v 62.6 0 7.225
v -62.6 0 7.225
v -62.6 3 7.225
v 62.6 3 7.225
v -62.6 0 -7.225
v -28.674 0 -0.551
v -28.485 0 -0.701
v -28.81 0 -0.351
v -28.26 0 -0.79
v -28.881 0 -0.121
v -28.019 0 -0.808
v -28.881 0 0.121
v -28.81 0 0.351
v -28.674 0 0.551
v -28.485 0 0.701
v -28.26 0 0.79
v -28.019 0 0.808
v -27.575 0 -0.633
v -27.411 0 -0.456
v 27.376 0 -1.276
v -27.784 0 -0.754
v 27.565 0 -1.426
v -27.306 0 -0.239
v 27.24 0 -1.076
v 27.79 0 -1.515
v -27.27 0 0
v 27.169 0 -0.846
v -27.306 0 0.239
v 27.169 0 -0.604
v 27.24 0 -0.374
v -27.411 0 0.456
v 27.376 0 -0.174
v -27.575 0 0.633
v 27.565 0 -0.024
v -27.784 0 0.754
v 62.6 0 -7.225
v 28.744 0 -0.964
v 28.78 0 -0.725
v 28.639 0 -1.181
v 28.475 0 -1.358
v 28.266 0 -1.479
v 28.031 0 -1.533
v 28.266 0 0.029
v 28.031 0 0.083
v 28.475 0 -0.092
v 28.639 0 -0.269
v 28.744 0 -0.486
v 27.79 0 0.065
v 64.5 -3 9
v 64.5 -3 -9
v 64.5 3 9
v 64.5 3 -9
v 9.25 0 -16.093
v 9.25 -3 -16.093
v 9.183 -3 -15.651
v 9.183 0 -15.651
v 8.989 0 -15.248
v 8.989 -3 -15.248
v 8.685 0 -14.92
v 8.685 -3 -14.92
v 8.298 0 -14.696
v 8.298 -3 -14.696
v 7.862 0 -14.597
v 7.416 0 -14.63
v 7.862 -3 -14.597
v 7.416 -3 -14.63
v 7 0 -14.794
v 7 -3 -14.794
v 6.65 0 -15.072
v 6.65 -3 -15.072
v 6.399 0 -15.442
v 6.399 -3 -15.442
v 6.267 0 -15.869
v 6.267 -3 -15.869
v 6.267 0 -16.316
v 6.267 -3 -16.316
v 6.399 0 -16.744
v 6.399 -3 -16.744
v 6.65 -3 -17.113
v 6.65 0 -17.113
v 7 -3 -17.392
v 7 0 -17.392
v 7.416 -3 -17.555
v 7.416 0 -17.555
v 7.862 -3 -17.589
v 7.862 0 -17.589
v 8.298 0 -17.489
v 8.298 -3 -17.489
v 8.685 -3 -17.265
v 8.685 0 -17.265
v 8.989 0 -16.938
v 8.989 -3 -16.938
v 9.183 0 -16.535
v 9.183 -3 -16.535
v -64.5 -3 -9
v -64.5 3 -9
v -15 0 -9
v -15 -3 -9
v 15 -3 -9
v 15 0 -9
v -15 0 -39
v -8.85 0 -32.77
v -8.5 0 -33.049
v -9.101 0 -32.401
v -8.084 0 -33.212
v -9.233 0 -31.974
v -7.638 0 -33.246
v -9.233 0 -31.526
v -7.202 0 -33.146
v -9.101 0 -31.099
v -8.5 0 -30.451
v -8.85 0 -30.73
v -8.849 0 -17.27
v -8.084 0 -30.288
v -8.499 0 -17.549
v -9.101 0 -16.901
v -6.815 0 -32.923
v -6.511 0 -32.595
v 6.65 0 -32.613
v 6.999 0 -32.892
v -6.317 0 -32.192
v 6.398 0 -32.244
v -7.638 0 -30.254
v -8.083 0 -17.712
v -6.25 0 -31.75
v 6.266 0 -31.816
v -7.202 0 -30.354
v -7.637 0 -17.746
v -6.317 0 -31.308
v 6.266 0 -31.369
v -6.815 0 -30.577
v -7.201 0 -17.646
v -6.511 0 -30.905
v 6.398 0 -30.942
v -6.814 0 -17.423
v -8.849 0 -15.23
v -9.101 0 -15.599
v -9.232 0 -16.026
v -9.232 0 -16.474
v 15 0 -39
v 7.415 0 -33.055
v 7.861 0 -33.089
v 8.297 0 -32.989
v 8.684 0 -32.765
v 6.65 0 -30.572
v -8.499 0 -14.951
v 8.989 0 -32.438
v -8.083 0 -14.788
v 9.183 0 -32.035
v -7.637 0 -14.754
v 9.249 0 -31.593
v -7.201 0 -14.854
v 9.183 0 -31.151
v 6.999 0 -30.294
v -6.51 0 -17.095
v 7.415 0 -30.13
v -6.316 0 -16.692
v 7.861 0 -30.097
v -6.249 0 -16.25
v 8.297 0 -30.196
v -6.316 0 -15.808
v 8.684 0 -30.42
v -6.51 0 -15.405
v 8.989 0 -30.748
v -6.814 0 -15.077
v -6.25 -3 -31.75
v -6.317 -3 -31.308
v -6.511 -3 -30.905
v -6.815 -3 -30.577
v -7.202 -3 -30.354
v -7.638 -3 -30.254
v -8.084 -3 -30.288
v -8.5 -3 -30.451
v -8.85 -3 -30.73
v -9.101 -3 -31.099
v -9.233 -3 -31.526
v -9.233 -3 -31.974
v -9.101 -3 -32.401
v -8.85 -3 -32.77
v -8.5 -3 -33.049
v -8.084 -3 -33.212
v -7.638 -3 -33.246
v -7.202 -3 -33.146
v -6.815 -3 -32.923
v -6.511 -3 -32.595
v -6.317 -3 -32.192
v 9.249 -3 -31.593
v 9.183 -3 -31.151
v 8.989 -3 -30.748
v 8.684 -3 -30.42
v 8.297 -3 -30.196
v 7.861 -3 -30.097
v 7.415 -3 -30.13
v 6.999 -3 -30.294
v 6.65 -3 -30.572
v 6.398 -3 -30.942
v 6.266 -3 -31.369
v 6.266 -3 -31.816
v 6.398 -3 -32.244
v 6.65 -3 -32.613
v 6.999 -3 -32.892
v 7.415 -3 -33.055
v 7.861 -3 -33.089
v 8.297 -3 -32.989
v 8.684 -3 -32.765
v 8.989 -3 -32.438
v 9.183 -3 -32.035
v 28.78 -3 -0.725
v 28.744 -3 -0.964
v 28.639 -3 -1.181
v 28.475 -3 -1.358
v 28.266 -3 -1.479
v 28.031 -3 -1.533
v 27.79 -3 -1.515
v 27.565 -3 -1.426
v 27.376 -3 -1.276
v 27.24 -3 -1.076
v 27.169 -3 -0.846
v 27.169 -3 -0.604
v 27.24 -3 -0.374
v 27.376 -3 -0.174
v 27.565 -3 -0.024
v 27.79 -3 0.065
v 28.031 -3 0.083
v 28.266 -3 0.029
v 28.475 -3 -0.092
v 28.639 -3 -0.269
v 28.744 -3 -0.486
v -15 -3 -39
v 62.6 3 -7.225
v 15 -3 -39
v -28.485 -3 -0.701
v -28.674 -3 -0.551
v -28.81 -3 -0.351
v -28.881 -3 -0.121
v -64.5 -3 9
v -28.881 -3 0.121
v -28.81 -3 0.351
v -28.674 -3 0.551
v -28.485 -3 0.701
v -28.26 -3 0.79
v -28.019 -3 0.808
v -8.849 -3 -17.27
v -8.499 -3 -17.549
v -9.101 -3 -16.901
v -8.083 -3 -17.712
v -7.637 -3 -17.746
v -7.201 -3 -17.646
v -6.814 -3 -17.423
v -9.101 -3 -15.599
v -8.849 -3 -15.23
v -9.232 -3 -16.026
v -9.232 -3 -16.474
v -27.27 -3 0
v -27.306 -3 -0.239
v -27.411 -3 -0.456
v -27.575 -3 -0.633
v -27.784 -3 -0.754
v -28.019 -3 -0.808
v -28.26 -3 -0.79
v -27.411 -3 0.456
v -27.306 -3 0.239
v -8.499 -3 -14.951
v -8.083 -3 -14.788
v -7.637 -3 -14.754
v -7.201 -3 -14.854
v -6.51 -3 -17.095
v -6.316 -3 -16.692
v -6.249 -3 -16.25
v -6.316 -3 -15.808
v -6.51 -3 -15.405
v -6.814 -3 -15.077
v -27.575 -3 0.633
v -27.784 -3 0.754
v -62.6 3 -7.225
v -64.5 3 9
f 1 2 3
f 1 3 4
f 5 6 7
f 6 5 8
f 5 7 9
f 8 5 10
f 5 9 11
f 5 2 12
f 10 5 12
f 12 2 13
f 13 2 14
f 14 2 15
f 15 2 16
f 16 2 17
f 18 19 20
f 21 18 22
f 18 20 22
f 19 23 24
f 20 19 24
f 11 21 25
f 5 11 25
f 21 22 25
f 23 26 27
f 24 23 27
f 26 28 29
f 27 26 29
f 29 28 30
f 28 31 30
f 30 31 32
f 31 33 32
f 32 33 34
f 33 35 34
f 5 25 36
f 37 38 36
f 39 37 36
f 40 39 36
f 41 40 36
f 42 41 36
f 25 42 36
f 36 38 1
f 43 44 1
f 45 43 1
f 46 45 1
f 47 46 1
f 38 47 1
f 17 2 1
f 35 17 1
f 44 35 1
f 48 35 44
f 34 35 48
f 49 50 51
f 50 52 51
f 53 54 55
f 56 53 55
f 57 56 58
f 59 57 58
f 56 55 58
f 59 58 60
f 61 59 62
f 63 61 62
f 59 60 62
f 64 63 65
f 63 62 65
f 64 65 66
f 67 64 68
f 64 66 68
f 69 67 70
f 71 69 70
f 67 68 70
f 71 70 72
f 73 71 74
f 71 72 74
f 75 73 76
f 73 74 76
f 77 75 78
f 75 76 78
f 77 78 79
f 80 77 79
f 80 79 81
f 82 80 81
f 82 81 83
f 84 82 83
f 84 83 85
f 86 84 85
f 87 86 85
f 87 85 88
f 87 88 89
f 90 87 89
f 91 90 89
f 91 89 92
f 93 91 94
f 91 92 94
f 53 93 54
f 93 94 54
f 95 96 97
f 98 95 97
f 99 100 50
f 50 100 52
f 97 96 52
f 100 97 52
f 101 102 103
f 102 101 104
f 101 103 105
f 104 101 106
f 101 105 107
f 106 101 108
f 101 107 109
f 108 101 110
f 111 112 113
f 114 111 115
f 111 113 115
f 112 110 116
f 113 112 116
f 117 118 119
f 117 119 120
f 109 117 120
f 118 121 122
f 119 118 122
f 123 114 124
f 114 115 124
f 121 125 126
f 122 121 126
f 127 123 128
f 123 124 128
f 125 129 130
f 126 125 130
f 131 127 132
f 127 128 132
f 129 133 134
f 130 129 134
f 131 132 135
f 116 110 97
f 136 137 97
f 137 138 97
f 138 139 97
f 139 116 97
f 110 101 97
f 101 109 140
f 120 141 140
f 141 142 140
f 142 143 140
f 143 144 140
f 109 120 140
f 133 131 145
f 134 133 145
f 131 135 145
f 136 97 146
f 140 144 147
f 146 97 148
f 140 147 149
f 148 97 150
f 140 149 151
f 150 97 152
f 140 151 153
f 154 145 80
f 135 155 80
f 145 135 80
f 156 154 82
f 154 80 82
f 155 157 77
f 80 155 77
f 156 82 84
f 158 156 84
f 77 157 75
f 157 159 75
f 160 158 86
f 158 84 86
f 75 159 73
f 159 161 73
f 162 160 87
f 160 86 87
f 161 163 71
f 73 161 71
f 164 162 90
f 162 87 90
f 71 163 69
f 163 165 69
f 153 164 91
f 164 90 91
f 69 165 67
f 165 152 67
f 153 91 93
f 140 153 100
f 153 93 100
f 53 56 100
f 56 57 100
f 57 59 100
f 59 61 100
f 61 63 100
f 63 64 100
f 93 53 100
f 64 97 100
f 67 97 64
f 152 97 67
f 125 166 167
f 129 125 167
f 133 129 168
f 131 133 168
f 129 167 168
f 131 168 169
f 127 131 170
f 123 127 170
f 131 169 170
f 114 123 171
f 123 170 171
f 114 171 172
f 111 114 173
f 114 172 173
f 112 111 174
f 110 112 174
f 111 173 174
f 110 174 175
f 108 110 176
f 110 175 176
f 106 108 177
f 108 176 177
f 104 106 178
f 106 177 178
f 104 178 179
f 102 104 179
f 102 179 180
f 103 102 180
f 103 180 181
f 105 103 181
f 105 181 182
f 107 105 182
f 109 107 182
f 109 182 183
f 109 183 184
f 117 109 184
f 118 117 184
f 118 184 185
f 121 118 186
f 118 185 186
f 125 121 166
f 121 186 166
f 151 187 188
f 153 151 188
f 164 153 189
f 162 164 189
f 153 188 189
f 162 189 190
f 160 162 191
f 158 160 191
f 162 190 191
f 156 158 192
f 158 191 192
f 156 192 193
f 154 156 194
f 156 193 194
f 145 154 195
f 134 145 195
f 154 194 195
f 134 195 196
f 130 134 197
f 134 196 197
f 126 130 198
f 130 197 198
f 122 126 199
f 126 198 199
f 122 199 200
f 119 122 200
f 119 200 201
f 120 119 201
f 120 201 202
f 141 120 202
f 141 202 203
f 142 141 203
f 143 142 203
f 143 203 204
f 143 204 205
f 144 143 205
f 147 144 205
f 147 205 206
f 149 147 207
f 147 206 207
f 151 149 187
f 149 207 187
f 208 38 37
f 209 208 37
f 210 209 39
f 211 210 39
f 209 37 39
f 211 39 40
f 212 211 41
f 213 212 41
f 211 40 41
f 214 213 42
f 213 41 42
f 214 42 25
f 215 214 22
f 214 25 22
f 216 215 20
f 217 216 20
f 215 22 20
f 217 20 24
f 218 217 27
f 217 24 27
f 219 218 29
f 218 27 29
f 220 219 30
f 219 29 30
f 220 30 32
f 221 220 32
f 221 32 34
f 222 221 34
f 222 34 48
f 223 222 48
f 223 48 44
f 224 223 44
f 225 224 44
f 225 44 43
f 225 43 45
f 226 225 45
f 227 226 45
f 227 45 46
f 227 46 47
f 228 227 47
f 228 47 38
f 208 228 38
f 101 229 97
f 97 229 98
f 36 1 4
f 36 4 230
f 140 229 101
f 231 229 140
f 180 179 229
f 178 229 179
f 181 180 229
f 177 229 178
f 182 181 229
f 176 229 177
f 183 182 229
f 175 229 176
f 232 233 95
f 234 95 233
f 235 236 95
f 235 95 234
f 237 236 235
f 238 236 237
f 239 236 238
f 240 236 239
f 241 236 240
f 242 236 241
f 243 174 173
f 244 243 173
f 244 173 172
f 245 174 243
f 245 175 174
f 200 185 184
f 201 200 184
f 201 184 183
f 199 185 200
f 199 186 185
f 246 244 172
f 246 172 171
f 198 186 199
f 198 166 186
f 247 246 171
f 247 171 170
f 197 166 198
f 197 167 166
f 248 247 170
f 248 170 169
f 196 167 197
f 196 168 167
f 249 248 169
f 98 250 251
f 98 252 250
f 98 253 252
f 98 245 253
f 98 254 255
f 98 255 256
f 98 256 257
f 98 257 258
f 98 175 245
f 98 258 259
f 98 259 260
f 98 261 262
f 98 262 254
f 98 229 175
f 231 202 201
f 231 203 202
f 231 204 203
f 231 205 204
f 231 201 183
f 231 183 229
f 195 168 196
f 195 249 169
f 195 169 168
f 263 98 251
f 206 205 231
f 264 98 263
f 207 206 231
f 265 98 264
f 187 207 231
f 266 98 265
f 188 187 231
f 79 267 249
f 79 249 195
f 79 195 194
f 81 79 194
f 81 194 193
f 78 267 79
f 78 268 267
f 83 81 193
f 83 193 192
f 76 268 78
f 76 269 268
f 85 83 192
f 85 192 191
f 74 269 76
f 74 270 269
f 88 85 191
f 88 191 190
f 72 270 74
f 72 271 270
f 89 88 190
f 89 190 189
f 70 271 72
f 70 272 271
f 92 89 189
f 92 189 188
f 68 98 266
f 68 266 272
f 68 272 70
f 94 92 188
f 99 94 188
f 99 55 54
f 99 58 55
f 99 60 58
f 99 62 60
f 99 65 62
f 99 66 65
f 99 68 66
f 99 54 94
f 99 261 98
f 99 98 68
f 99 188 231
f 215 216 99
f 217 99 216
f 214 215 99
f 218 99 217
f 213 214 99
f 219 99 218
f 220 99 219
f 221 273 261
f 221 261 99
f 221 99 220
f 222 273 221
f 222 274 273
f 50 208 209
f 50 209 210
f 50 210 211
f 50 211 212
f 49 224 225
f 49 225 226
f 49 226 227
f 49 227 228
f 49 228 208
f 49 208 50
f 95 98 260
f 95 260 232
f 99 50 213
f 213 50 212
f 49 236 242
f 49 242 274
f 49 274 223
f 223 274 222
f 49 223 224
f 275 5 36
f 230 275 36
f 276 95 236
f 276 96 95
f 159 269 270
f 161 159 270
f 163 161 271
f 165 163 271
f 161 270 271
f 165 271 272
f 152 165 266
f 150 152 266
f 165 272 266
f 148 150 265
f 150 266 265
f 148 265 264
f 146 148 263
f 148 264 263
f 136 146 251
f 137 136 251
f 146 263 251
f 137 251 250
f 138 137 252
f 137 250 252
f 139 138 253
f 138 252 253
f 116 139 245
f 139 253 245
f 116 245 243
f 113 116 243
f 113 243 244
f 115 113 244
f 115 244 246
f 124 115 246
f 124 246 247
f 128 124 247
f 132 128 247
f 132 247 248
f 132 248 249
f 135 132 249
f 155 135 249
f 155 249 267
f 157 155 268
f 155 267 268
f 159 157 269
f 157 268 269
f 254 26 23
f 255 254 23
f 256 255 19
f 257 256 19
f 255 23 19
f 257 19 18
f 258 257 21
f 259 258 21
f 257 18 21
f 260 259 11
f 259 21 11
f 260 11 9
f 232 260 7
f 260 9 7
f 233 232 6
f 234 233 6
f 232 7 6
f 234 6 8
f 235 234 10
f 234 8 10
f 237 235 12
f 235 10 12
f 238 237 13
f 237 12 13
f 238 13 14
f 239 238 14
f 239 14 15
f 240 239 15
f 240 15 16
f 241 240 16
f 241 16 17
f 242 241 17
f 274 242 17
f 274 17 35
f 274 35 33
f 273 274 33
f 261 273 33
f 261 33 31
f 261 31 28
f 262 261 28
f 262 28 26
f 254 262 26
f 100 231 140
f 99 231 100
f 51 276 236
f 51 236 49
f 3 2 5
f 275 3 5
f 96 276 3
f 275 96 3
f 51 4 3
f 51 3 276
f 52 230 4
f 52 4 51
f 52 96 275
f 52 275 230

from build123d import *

# Parameters (mm, degrees)
SKETCH1_W           = 129
SKETCH1_H           = 18
SKETCH1_W_2         = 125.2
SKETCH1_H_2         = 14.45
BOSS_EXTRUDE1_DEPTH = 3
SKETCH2_W           = 129
SKETCH2_H           = 18
BOSS_EXTRUDE2_DEPTH = 3
SKETCH4_R           = 0.81
CUT_EXTRUDE1_DEPTH  = 4
SKETCH5_W           = 30
SKETCH5_H           = 30
SKETCH5_R           = 1.5
BOSS_EXTRUDE4_DEPTH = 3


with BuildPart() as part:
    # Sketch1 → Boss-Extrude1 (new body)
    with BuildSketch(Plane(origin=(0, 0, 0), x_dir=(1, 0, 0), z_dir=(0, 1, 0))):
        Rectangle(SKETCH1_W, SKETCH1_H)
        Rectangle(SKETCH1_W_2, SKETCH1_H_2, mode=Mode.SUBTRACT)
    extrude(amount=BOSS_EXTRUDE1_DEPTH)

    # Sketch2 → Boss-Extrude2 (add)
    with BuildSketch(Plane.XZ):
        Rectangle(SKETCH2_W, SKETCH2_H)
    extrude(amount=BOSS_EXTRUDE2_DEPTH)

    # Sketch4 → Cut-Extrude1 (cut, through all)
    with BuildSketch(Plane(origin=(0, 0, 0), x_dir=(1, 0, 0), z_dir=(0, 1, 0))):
        with Locations((27.97, 0.725)):
            Circle(SKETCH4_R)
        with Locations((-28.08, 0)):
            Circle(SKETCH4_R)
    extrude(amount=-CUT_EXTRUDE1_DEPTH, mode=Mode.SUBTRACT)

    # Sketch5 → Boss-Extrude4 (add)
    with BuildSketch(Plane.XZ.offset(3)):
        with Locations((0, -24)):
            Rectangle(SKETCH5_W, SKETCH5_H)
        with Locations((7.75, -16.092702878)):
            Circle(SKETCH5_R, mode=Mode.SUBTRACT)
        with Locations((7.749201838, -31.592702857)):
            Circle(SKETCH5_R, mode=Mode.SUBTRACT)
        with Locations((-7.75, -31.75)):
            Circle(SKETCH5_R, mode=Mode.SUBTRACT)
        with Locations((-7.749201838, -16.250000021)):
            Circle(SKETCH5_R, mode=Mode.SUBTRACT)
    extrude(amount=-BOSS_EXTRUDE4_DEPTH)


solid = part.part
